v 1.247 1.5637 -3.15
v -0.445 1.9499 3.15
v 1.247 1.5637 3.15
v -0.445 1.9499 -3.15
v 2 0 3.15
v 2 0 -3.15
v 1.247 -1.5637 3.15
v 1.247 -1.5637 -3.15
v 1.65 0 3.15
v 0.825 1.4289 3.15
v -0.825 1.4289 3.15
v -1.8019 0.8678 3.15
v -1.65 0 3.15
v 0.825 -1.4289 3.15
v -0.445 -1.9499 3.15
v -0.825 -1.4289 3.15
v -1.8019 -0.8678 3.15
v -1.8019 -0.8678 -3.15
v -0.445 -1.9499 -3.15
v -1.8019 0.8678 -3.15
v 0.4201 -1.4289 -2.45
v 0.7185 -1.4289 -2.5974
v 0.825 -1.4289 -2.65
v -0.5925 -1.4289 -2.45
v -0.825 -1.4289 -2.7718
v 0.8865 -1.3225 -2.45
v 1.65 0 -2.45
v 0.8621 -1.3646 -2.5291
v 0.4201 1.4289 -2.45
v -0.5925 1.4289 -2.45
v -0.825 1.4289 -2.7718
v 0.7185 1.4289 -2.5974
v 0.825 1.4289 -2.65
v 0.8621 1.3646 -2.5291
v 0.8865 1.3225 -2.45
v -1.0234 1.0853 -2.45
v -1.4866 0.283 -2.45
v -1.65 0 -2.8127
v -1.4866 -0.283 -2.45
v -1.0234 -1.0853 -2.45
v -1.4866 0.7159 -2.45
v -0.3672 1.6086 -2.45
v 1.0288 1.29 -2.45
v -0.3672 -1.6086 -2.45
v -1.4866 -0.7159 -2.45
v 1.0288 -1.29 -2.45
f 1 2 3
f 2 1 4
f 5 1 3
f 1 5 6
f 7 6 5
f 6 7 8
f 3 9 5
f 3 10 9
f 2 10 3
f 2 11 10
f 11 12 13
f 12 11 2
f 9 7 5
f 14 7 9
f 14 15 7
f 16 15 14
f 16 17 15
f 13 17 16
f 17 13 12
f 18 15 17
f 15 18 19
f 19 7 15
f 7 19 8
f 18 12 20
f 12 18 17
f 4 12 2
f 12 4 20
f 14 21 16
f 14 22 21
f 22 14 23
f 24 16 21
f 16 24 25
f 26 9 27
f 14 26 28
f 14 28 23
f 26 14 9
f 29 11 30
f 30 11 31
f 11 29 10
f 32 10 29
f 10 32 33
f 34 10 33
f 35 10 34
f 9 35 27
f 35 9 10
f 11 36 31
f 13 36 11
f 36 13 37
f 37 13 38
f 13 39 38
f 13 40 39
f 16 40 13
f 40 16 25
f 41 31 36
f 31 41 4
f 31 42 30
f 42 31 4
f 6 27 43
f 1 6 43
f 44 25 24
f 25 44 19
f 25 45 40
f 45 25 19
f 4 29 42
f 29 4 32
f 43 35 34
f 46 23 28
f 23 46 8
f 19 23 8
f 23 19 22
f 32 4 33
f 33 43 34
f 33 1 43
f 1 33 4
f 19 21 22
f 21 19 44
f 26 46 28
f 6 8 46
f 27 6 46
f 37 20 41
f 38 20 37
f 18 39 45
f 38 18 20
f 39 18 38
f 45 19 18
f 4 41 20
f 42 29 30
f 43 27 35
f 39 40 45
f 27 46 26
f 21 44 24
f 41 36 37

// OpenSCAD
// Parameters
outer_diameter = 4; //[2:8:0.1]
outer_diameter_tolerance = 0; //[-0.2:0.2:0.01]
length = 6.3; //[3.15:12.6:0.1]
length_tolerance = 0; //[-0.5:0.5:0.01]
screw_diameter = 4; //[2:8:0.1]
internal_thread_pitch = 0.7; //[0.35:1.4:0.05]
internal_minor_diameter_est = 3.3; //[2:6:0.05]
internal_bore_diameter = 3.3; //[2:6:0.05]
chamfer_length = 0.5; //[0.2:1.5:0.05]
chamfer_angle_deg = 45; //[20:70:1]
eps = 0.2; //[0.05:0.5:0.01]

// Threaded Insert - complete geometry
module threaded_insert() {
  color([0.8, 0.6, 0.2]) { // Brass color
    difference() {
      // Insert body
      cylinder(
        h = length + length_tolerance,
        r = (outer_diameter + outer_diameter_tolerance) / 2,
        center = true
      );
      
      // Internal thread bore
      translate([0, 0, 0])
        cylinder(
          h = (length + length_tolerance) + 2 * eps,
          r = internal_bore_diameter / 2,
          center = true
        );
      
      // Lead-in chamfer
      translate([0, 0, -(length + length_tolerance) / 2 + (chamfer_length + eps) / 2])
        cylinder(
          h = chamfer_length + eps,
          r1 = (outer_diameter + outer_diameter_tolerance) / 2,
          r2 = internal_bore_diameter / 2,
          center = true
        );
    }
  }
}

// Assembly
module assembly() {
  threaded_insert();
}

assembly();
